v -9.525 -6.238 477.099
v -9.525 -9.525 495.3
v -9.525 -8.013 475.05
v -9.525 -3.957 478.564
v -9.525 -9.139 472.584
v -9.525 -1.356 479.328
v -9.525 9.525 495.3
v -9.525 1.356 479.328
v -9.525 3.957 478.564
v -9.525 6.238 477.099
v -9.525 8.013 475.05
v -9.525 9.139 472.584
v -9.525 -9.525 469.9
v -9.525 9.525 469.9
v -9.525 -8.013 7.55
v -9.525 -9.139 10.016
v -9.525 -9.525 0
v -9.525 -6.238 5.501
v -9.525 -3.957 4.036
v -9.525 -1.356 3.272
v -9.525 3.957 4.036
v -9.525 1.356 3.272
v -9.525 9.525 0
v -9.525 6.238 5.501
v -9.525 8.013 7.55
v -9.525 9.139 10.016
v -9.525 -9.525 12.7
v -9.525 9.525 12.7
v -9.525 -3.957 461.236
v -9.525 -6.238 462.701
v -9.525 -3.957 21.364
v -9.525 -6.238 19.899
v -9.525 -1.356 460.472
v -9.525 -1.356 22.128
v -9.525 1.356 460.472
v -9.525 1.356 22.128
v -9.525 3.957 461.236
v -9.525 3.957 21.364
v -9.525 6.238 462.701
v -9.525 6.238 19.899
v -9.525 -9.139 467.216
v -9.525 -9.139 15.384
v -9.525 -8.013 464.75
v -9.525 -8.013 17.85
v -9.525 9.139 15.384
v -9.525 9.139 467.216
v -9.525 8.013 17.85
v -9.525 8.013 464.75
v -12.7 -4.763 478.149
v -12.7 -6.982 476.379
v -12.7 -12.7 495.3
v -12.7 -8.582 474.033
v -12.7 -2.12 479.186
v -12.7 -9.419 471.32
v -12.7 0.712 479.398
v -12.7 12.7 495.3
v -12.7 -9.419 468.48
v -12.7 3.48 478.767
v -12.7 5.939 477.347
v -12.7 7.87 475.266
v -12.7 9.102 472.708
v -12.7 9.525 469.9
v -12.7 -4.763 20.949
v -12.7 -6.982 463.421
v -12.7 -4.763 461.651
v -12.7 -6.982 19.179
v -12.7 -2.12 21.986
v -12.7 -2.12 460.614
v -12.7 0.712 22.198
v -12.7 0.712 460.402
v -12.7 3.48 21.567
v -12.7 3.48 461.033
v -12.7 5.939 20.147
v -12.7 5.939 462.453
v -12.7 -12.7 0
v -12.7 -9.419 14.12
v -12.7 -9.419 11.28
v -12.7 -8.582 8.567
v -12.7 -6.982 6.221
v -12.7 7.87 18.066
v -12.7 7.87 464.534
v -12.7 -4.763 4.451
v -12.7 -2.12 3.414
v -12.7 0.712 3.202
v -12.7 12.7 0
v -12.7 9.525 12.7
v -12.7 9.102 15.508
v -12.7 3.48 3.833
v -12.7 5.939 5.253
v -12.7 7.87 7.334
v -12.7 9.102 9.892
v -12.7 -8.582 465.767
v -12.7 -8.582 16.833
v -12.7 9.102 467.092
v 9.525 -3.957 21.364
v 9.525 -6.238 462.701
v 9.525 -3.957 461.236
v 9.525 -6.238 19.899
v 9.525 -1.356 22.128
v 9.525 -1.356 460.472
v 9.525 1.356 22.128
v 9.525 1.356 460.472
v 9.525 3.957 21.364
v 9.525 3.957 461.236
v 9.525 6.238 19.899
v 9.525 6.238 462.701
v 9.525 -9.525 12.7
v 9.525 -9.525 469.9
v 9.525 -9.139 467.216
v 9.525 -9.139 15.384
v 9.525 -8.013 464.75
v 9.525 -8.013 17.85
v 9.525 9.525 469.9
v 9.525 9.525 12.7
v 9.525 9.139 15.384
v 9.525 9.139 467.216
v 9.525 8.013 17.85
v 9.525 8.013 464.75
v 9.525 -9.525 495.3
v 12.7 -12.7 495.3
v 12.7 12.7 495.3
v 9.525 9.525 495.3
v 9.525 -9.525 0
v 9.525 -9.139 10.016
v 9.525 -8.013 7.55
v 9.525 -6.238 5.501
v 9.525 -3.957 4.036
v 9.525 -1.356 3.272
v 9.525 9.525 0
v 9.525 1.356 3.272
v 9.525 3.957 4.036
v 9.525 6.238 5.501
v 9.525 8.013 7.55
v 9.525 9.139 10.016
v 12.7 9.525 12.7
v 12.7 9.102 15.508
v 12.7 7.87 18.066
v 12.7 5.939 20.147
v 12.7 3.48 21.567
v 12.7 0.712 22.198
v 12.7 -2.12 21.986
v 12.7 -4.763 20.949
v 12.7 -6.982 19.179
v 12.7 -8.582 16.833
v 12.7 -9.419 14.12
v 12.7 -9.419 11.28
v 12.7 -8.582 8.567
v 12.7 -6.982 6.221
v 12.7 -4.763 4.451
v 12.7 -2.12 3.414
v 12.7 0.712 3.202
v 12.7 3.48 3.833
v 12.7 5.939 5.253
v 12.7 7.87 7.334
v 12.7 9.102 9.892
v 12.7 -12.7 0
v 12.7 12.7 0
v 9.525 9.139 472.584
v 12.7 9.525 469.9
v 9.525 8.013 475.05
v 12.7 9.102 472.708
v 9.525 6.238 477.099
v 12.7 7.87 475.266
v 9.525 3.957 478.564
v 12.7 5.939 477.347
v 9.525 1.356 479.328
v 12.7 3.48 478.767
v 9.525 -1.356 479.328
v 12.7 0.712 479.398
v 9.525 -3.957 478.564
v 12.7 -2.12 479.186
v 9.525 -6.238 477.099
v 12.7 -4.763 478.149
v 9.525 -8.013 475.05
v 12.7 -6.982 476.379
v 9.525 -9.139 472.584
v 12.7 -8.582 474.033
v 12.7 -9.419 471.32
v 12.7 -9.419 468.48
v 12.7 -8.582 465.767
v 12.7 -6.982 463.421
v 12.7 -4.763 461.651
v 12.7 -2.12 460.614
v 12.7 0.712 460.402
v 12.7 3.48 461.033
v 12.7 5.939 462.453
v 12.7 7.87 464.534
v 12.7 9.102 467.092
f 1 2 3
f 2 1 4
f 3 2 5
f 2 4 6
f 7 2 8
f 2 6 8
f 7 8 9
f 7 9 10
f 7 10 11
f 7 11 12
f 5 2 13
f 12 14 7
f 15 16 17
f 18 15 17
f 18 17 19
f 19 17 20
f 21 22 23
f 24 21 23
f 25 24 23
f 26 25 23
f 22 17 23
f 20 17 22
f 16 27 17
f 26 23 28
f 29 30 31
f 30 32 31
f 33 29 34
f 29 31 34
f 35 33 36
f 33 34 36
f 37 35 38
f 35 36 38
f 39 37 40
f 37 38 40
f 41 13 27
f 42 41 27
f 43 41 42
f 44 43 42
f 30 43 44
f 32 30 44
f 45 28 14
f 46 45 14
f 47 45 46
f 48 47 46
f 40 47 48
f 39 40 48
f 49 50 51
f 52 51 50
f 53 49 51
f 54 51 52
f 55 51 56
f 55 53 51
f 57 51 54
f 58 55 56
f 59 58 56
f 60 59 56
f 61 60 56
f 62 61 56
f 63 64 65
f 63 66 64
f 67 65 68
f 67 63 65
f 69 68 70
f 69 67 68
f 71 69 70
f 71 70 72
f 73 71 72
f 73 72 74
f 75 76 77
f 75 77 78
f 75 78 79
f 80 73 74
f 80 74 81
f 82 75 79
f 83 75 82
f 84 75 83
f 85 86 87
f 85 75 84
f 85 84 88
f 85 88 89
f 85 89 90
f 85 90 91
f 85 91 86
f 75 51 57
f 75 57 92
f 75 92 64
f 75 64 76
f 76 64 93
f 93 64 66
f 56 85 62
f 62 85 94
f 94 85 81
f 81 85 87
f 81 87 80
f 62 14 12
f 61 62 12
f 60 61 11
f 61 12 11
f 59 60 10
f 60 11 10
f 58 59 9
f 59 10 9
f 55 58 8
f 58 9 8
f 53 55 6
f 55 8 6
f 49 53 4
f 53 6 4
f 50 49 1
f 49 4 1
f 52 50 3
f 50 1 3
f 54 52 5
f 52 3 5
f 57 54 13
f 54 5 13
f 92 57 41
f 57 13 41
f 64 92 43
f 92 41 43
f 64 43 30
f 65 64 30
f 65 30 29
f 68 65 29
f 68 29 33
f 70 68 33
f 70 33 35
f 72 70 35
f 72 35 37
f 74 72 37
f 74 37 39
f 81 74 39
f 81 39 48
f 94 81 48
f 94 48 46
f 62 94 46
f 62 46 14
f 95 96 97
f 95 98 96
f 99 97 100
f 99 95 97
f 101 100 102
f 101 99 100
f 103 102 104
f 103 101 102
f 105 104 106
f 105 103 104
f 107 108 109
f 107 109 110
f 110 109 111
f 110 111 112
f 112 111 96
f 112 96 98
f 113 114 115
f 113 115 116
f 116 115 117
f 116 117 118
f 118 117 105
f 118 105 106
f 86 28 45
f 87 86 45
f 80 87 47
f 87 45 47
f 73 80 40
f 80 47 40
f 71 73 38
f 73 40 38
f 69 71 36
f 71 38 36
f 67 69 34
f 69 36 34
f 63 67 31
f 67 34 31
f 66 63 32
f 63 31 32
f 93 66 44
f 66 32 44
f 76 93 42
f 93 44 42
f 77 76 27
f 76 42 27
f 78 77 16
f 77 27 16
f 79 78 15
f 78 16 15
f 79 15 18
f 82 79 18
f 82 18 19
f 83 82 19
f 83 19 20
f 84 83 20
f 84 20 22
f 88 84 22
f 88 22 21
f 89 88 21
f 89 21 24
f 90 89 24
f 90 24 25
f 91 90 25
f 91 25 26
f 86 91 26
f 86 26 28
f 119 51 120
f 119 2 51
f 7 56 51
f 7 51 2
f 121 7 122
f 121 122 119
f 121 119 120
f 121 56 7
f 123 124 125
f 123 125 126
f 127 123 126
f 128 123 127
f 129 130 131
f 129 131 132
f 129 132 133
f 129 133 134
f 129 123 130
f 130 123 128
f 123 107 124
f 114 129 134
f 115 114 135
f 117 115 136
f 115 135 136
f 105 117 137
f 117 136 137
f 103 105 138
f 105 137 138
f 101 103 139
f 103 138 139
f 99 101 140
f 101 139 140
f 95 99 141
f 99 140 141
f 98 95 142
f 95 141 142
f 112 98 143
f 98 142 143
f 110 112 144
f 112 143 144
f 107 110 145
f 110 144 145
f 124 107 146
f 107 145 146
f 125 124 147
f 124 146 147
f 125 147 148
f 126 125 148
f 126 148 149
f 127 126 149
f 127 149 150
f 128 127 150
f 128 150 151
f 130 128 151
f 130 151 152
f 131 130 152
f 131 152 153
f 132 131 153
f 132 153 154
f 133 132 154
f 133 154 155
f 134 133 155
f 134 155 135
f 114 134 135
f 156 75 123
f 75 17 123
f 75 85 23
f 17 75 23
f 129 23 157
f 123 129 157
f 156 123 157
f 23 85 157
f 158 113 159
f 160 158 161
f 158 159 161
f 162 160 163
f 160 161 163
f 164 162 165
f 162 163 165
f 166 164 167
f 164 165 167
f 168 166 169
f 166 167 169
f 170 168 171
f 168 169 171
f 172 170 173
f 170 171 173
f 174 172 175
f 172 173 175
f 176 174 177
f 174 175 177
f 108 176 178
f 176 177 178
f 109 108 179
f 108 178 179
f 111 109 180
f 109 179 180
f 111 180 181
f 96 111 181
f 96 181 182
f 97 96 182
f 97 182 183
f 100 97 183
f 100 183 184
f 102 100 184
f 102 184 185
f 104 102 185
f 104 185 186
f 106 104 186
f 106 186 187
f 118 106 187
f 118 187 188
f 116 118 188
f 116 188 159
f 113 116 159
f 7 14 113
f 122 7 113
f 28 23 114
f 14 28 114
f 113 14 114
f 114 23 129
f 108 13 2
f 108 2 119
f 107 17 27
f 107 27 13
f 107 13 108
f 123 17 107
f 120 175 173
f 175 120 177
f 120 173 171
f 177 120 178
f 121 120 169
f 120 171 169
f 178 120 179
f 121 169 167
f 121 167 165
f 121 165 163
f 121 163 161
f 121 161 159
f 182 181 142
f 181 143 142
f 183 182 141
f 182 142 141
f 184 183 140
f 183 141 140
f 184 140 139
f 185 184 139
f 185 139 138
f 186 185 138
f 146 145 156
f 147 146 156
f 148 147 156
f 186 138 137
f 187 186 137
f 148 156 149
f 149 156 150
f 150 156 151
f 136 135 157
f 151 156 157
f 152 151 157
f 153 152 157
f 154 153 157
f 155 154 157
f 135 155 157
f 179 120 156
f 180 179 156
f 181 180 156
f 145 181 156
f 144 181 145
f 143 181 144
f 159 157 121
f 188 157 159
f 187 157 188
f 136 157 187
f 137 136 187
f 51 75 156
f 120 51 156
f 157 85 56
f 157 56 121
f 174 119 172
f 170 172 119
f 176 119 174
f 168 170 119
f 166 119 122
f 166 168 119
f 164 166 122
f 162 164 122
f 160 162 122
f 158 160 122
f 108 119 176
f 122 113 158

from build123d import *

# Parameters (mm, degrees)
F0_W     = 25.4
F0_H     = 25.4
F0_W_2   = 19.05
F0_H_2   = 19.05
F1_DEPTH = 495.3
F2_R     = 9.525
F3_DEPTH = 25.4
F4_R     = 9.525
F5_DEPTH = 25.4


with BuildPart() as f1:
    # F0 (on Top) → F1 (new body)
    with BuildSketch(Plane.XY):
        Rectangle(F0_W, F0_H)
        Rectangle(F0_W_2, F0_H_2, mode=Mode.SUBTRACT)
    extrude(amount=F1_DEPTH)

    # F2 (on face) → F3 (cut)
    with BuildSketch(Plane.YZ.offset(12.7)):
        with Locations((0, 469.9)):
            Circle(F2_R)
    extrude(amount=-F3_DEPTH, mode=Mode.SUBTRACT)

    # F4 (on face) → F5 (cut)
    with BuildSketch(Plane.YZ.offset(12.7)):
        with Locations((0, 12.7)):
            Circle(F4_R)
    extrude(amount=-F5_DEPTH, mode=Mode.SUBTRACT)


solid = f1.part
